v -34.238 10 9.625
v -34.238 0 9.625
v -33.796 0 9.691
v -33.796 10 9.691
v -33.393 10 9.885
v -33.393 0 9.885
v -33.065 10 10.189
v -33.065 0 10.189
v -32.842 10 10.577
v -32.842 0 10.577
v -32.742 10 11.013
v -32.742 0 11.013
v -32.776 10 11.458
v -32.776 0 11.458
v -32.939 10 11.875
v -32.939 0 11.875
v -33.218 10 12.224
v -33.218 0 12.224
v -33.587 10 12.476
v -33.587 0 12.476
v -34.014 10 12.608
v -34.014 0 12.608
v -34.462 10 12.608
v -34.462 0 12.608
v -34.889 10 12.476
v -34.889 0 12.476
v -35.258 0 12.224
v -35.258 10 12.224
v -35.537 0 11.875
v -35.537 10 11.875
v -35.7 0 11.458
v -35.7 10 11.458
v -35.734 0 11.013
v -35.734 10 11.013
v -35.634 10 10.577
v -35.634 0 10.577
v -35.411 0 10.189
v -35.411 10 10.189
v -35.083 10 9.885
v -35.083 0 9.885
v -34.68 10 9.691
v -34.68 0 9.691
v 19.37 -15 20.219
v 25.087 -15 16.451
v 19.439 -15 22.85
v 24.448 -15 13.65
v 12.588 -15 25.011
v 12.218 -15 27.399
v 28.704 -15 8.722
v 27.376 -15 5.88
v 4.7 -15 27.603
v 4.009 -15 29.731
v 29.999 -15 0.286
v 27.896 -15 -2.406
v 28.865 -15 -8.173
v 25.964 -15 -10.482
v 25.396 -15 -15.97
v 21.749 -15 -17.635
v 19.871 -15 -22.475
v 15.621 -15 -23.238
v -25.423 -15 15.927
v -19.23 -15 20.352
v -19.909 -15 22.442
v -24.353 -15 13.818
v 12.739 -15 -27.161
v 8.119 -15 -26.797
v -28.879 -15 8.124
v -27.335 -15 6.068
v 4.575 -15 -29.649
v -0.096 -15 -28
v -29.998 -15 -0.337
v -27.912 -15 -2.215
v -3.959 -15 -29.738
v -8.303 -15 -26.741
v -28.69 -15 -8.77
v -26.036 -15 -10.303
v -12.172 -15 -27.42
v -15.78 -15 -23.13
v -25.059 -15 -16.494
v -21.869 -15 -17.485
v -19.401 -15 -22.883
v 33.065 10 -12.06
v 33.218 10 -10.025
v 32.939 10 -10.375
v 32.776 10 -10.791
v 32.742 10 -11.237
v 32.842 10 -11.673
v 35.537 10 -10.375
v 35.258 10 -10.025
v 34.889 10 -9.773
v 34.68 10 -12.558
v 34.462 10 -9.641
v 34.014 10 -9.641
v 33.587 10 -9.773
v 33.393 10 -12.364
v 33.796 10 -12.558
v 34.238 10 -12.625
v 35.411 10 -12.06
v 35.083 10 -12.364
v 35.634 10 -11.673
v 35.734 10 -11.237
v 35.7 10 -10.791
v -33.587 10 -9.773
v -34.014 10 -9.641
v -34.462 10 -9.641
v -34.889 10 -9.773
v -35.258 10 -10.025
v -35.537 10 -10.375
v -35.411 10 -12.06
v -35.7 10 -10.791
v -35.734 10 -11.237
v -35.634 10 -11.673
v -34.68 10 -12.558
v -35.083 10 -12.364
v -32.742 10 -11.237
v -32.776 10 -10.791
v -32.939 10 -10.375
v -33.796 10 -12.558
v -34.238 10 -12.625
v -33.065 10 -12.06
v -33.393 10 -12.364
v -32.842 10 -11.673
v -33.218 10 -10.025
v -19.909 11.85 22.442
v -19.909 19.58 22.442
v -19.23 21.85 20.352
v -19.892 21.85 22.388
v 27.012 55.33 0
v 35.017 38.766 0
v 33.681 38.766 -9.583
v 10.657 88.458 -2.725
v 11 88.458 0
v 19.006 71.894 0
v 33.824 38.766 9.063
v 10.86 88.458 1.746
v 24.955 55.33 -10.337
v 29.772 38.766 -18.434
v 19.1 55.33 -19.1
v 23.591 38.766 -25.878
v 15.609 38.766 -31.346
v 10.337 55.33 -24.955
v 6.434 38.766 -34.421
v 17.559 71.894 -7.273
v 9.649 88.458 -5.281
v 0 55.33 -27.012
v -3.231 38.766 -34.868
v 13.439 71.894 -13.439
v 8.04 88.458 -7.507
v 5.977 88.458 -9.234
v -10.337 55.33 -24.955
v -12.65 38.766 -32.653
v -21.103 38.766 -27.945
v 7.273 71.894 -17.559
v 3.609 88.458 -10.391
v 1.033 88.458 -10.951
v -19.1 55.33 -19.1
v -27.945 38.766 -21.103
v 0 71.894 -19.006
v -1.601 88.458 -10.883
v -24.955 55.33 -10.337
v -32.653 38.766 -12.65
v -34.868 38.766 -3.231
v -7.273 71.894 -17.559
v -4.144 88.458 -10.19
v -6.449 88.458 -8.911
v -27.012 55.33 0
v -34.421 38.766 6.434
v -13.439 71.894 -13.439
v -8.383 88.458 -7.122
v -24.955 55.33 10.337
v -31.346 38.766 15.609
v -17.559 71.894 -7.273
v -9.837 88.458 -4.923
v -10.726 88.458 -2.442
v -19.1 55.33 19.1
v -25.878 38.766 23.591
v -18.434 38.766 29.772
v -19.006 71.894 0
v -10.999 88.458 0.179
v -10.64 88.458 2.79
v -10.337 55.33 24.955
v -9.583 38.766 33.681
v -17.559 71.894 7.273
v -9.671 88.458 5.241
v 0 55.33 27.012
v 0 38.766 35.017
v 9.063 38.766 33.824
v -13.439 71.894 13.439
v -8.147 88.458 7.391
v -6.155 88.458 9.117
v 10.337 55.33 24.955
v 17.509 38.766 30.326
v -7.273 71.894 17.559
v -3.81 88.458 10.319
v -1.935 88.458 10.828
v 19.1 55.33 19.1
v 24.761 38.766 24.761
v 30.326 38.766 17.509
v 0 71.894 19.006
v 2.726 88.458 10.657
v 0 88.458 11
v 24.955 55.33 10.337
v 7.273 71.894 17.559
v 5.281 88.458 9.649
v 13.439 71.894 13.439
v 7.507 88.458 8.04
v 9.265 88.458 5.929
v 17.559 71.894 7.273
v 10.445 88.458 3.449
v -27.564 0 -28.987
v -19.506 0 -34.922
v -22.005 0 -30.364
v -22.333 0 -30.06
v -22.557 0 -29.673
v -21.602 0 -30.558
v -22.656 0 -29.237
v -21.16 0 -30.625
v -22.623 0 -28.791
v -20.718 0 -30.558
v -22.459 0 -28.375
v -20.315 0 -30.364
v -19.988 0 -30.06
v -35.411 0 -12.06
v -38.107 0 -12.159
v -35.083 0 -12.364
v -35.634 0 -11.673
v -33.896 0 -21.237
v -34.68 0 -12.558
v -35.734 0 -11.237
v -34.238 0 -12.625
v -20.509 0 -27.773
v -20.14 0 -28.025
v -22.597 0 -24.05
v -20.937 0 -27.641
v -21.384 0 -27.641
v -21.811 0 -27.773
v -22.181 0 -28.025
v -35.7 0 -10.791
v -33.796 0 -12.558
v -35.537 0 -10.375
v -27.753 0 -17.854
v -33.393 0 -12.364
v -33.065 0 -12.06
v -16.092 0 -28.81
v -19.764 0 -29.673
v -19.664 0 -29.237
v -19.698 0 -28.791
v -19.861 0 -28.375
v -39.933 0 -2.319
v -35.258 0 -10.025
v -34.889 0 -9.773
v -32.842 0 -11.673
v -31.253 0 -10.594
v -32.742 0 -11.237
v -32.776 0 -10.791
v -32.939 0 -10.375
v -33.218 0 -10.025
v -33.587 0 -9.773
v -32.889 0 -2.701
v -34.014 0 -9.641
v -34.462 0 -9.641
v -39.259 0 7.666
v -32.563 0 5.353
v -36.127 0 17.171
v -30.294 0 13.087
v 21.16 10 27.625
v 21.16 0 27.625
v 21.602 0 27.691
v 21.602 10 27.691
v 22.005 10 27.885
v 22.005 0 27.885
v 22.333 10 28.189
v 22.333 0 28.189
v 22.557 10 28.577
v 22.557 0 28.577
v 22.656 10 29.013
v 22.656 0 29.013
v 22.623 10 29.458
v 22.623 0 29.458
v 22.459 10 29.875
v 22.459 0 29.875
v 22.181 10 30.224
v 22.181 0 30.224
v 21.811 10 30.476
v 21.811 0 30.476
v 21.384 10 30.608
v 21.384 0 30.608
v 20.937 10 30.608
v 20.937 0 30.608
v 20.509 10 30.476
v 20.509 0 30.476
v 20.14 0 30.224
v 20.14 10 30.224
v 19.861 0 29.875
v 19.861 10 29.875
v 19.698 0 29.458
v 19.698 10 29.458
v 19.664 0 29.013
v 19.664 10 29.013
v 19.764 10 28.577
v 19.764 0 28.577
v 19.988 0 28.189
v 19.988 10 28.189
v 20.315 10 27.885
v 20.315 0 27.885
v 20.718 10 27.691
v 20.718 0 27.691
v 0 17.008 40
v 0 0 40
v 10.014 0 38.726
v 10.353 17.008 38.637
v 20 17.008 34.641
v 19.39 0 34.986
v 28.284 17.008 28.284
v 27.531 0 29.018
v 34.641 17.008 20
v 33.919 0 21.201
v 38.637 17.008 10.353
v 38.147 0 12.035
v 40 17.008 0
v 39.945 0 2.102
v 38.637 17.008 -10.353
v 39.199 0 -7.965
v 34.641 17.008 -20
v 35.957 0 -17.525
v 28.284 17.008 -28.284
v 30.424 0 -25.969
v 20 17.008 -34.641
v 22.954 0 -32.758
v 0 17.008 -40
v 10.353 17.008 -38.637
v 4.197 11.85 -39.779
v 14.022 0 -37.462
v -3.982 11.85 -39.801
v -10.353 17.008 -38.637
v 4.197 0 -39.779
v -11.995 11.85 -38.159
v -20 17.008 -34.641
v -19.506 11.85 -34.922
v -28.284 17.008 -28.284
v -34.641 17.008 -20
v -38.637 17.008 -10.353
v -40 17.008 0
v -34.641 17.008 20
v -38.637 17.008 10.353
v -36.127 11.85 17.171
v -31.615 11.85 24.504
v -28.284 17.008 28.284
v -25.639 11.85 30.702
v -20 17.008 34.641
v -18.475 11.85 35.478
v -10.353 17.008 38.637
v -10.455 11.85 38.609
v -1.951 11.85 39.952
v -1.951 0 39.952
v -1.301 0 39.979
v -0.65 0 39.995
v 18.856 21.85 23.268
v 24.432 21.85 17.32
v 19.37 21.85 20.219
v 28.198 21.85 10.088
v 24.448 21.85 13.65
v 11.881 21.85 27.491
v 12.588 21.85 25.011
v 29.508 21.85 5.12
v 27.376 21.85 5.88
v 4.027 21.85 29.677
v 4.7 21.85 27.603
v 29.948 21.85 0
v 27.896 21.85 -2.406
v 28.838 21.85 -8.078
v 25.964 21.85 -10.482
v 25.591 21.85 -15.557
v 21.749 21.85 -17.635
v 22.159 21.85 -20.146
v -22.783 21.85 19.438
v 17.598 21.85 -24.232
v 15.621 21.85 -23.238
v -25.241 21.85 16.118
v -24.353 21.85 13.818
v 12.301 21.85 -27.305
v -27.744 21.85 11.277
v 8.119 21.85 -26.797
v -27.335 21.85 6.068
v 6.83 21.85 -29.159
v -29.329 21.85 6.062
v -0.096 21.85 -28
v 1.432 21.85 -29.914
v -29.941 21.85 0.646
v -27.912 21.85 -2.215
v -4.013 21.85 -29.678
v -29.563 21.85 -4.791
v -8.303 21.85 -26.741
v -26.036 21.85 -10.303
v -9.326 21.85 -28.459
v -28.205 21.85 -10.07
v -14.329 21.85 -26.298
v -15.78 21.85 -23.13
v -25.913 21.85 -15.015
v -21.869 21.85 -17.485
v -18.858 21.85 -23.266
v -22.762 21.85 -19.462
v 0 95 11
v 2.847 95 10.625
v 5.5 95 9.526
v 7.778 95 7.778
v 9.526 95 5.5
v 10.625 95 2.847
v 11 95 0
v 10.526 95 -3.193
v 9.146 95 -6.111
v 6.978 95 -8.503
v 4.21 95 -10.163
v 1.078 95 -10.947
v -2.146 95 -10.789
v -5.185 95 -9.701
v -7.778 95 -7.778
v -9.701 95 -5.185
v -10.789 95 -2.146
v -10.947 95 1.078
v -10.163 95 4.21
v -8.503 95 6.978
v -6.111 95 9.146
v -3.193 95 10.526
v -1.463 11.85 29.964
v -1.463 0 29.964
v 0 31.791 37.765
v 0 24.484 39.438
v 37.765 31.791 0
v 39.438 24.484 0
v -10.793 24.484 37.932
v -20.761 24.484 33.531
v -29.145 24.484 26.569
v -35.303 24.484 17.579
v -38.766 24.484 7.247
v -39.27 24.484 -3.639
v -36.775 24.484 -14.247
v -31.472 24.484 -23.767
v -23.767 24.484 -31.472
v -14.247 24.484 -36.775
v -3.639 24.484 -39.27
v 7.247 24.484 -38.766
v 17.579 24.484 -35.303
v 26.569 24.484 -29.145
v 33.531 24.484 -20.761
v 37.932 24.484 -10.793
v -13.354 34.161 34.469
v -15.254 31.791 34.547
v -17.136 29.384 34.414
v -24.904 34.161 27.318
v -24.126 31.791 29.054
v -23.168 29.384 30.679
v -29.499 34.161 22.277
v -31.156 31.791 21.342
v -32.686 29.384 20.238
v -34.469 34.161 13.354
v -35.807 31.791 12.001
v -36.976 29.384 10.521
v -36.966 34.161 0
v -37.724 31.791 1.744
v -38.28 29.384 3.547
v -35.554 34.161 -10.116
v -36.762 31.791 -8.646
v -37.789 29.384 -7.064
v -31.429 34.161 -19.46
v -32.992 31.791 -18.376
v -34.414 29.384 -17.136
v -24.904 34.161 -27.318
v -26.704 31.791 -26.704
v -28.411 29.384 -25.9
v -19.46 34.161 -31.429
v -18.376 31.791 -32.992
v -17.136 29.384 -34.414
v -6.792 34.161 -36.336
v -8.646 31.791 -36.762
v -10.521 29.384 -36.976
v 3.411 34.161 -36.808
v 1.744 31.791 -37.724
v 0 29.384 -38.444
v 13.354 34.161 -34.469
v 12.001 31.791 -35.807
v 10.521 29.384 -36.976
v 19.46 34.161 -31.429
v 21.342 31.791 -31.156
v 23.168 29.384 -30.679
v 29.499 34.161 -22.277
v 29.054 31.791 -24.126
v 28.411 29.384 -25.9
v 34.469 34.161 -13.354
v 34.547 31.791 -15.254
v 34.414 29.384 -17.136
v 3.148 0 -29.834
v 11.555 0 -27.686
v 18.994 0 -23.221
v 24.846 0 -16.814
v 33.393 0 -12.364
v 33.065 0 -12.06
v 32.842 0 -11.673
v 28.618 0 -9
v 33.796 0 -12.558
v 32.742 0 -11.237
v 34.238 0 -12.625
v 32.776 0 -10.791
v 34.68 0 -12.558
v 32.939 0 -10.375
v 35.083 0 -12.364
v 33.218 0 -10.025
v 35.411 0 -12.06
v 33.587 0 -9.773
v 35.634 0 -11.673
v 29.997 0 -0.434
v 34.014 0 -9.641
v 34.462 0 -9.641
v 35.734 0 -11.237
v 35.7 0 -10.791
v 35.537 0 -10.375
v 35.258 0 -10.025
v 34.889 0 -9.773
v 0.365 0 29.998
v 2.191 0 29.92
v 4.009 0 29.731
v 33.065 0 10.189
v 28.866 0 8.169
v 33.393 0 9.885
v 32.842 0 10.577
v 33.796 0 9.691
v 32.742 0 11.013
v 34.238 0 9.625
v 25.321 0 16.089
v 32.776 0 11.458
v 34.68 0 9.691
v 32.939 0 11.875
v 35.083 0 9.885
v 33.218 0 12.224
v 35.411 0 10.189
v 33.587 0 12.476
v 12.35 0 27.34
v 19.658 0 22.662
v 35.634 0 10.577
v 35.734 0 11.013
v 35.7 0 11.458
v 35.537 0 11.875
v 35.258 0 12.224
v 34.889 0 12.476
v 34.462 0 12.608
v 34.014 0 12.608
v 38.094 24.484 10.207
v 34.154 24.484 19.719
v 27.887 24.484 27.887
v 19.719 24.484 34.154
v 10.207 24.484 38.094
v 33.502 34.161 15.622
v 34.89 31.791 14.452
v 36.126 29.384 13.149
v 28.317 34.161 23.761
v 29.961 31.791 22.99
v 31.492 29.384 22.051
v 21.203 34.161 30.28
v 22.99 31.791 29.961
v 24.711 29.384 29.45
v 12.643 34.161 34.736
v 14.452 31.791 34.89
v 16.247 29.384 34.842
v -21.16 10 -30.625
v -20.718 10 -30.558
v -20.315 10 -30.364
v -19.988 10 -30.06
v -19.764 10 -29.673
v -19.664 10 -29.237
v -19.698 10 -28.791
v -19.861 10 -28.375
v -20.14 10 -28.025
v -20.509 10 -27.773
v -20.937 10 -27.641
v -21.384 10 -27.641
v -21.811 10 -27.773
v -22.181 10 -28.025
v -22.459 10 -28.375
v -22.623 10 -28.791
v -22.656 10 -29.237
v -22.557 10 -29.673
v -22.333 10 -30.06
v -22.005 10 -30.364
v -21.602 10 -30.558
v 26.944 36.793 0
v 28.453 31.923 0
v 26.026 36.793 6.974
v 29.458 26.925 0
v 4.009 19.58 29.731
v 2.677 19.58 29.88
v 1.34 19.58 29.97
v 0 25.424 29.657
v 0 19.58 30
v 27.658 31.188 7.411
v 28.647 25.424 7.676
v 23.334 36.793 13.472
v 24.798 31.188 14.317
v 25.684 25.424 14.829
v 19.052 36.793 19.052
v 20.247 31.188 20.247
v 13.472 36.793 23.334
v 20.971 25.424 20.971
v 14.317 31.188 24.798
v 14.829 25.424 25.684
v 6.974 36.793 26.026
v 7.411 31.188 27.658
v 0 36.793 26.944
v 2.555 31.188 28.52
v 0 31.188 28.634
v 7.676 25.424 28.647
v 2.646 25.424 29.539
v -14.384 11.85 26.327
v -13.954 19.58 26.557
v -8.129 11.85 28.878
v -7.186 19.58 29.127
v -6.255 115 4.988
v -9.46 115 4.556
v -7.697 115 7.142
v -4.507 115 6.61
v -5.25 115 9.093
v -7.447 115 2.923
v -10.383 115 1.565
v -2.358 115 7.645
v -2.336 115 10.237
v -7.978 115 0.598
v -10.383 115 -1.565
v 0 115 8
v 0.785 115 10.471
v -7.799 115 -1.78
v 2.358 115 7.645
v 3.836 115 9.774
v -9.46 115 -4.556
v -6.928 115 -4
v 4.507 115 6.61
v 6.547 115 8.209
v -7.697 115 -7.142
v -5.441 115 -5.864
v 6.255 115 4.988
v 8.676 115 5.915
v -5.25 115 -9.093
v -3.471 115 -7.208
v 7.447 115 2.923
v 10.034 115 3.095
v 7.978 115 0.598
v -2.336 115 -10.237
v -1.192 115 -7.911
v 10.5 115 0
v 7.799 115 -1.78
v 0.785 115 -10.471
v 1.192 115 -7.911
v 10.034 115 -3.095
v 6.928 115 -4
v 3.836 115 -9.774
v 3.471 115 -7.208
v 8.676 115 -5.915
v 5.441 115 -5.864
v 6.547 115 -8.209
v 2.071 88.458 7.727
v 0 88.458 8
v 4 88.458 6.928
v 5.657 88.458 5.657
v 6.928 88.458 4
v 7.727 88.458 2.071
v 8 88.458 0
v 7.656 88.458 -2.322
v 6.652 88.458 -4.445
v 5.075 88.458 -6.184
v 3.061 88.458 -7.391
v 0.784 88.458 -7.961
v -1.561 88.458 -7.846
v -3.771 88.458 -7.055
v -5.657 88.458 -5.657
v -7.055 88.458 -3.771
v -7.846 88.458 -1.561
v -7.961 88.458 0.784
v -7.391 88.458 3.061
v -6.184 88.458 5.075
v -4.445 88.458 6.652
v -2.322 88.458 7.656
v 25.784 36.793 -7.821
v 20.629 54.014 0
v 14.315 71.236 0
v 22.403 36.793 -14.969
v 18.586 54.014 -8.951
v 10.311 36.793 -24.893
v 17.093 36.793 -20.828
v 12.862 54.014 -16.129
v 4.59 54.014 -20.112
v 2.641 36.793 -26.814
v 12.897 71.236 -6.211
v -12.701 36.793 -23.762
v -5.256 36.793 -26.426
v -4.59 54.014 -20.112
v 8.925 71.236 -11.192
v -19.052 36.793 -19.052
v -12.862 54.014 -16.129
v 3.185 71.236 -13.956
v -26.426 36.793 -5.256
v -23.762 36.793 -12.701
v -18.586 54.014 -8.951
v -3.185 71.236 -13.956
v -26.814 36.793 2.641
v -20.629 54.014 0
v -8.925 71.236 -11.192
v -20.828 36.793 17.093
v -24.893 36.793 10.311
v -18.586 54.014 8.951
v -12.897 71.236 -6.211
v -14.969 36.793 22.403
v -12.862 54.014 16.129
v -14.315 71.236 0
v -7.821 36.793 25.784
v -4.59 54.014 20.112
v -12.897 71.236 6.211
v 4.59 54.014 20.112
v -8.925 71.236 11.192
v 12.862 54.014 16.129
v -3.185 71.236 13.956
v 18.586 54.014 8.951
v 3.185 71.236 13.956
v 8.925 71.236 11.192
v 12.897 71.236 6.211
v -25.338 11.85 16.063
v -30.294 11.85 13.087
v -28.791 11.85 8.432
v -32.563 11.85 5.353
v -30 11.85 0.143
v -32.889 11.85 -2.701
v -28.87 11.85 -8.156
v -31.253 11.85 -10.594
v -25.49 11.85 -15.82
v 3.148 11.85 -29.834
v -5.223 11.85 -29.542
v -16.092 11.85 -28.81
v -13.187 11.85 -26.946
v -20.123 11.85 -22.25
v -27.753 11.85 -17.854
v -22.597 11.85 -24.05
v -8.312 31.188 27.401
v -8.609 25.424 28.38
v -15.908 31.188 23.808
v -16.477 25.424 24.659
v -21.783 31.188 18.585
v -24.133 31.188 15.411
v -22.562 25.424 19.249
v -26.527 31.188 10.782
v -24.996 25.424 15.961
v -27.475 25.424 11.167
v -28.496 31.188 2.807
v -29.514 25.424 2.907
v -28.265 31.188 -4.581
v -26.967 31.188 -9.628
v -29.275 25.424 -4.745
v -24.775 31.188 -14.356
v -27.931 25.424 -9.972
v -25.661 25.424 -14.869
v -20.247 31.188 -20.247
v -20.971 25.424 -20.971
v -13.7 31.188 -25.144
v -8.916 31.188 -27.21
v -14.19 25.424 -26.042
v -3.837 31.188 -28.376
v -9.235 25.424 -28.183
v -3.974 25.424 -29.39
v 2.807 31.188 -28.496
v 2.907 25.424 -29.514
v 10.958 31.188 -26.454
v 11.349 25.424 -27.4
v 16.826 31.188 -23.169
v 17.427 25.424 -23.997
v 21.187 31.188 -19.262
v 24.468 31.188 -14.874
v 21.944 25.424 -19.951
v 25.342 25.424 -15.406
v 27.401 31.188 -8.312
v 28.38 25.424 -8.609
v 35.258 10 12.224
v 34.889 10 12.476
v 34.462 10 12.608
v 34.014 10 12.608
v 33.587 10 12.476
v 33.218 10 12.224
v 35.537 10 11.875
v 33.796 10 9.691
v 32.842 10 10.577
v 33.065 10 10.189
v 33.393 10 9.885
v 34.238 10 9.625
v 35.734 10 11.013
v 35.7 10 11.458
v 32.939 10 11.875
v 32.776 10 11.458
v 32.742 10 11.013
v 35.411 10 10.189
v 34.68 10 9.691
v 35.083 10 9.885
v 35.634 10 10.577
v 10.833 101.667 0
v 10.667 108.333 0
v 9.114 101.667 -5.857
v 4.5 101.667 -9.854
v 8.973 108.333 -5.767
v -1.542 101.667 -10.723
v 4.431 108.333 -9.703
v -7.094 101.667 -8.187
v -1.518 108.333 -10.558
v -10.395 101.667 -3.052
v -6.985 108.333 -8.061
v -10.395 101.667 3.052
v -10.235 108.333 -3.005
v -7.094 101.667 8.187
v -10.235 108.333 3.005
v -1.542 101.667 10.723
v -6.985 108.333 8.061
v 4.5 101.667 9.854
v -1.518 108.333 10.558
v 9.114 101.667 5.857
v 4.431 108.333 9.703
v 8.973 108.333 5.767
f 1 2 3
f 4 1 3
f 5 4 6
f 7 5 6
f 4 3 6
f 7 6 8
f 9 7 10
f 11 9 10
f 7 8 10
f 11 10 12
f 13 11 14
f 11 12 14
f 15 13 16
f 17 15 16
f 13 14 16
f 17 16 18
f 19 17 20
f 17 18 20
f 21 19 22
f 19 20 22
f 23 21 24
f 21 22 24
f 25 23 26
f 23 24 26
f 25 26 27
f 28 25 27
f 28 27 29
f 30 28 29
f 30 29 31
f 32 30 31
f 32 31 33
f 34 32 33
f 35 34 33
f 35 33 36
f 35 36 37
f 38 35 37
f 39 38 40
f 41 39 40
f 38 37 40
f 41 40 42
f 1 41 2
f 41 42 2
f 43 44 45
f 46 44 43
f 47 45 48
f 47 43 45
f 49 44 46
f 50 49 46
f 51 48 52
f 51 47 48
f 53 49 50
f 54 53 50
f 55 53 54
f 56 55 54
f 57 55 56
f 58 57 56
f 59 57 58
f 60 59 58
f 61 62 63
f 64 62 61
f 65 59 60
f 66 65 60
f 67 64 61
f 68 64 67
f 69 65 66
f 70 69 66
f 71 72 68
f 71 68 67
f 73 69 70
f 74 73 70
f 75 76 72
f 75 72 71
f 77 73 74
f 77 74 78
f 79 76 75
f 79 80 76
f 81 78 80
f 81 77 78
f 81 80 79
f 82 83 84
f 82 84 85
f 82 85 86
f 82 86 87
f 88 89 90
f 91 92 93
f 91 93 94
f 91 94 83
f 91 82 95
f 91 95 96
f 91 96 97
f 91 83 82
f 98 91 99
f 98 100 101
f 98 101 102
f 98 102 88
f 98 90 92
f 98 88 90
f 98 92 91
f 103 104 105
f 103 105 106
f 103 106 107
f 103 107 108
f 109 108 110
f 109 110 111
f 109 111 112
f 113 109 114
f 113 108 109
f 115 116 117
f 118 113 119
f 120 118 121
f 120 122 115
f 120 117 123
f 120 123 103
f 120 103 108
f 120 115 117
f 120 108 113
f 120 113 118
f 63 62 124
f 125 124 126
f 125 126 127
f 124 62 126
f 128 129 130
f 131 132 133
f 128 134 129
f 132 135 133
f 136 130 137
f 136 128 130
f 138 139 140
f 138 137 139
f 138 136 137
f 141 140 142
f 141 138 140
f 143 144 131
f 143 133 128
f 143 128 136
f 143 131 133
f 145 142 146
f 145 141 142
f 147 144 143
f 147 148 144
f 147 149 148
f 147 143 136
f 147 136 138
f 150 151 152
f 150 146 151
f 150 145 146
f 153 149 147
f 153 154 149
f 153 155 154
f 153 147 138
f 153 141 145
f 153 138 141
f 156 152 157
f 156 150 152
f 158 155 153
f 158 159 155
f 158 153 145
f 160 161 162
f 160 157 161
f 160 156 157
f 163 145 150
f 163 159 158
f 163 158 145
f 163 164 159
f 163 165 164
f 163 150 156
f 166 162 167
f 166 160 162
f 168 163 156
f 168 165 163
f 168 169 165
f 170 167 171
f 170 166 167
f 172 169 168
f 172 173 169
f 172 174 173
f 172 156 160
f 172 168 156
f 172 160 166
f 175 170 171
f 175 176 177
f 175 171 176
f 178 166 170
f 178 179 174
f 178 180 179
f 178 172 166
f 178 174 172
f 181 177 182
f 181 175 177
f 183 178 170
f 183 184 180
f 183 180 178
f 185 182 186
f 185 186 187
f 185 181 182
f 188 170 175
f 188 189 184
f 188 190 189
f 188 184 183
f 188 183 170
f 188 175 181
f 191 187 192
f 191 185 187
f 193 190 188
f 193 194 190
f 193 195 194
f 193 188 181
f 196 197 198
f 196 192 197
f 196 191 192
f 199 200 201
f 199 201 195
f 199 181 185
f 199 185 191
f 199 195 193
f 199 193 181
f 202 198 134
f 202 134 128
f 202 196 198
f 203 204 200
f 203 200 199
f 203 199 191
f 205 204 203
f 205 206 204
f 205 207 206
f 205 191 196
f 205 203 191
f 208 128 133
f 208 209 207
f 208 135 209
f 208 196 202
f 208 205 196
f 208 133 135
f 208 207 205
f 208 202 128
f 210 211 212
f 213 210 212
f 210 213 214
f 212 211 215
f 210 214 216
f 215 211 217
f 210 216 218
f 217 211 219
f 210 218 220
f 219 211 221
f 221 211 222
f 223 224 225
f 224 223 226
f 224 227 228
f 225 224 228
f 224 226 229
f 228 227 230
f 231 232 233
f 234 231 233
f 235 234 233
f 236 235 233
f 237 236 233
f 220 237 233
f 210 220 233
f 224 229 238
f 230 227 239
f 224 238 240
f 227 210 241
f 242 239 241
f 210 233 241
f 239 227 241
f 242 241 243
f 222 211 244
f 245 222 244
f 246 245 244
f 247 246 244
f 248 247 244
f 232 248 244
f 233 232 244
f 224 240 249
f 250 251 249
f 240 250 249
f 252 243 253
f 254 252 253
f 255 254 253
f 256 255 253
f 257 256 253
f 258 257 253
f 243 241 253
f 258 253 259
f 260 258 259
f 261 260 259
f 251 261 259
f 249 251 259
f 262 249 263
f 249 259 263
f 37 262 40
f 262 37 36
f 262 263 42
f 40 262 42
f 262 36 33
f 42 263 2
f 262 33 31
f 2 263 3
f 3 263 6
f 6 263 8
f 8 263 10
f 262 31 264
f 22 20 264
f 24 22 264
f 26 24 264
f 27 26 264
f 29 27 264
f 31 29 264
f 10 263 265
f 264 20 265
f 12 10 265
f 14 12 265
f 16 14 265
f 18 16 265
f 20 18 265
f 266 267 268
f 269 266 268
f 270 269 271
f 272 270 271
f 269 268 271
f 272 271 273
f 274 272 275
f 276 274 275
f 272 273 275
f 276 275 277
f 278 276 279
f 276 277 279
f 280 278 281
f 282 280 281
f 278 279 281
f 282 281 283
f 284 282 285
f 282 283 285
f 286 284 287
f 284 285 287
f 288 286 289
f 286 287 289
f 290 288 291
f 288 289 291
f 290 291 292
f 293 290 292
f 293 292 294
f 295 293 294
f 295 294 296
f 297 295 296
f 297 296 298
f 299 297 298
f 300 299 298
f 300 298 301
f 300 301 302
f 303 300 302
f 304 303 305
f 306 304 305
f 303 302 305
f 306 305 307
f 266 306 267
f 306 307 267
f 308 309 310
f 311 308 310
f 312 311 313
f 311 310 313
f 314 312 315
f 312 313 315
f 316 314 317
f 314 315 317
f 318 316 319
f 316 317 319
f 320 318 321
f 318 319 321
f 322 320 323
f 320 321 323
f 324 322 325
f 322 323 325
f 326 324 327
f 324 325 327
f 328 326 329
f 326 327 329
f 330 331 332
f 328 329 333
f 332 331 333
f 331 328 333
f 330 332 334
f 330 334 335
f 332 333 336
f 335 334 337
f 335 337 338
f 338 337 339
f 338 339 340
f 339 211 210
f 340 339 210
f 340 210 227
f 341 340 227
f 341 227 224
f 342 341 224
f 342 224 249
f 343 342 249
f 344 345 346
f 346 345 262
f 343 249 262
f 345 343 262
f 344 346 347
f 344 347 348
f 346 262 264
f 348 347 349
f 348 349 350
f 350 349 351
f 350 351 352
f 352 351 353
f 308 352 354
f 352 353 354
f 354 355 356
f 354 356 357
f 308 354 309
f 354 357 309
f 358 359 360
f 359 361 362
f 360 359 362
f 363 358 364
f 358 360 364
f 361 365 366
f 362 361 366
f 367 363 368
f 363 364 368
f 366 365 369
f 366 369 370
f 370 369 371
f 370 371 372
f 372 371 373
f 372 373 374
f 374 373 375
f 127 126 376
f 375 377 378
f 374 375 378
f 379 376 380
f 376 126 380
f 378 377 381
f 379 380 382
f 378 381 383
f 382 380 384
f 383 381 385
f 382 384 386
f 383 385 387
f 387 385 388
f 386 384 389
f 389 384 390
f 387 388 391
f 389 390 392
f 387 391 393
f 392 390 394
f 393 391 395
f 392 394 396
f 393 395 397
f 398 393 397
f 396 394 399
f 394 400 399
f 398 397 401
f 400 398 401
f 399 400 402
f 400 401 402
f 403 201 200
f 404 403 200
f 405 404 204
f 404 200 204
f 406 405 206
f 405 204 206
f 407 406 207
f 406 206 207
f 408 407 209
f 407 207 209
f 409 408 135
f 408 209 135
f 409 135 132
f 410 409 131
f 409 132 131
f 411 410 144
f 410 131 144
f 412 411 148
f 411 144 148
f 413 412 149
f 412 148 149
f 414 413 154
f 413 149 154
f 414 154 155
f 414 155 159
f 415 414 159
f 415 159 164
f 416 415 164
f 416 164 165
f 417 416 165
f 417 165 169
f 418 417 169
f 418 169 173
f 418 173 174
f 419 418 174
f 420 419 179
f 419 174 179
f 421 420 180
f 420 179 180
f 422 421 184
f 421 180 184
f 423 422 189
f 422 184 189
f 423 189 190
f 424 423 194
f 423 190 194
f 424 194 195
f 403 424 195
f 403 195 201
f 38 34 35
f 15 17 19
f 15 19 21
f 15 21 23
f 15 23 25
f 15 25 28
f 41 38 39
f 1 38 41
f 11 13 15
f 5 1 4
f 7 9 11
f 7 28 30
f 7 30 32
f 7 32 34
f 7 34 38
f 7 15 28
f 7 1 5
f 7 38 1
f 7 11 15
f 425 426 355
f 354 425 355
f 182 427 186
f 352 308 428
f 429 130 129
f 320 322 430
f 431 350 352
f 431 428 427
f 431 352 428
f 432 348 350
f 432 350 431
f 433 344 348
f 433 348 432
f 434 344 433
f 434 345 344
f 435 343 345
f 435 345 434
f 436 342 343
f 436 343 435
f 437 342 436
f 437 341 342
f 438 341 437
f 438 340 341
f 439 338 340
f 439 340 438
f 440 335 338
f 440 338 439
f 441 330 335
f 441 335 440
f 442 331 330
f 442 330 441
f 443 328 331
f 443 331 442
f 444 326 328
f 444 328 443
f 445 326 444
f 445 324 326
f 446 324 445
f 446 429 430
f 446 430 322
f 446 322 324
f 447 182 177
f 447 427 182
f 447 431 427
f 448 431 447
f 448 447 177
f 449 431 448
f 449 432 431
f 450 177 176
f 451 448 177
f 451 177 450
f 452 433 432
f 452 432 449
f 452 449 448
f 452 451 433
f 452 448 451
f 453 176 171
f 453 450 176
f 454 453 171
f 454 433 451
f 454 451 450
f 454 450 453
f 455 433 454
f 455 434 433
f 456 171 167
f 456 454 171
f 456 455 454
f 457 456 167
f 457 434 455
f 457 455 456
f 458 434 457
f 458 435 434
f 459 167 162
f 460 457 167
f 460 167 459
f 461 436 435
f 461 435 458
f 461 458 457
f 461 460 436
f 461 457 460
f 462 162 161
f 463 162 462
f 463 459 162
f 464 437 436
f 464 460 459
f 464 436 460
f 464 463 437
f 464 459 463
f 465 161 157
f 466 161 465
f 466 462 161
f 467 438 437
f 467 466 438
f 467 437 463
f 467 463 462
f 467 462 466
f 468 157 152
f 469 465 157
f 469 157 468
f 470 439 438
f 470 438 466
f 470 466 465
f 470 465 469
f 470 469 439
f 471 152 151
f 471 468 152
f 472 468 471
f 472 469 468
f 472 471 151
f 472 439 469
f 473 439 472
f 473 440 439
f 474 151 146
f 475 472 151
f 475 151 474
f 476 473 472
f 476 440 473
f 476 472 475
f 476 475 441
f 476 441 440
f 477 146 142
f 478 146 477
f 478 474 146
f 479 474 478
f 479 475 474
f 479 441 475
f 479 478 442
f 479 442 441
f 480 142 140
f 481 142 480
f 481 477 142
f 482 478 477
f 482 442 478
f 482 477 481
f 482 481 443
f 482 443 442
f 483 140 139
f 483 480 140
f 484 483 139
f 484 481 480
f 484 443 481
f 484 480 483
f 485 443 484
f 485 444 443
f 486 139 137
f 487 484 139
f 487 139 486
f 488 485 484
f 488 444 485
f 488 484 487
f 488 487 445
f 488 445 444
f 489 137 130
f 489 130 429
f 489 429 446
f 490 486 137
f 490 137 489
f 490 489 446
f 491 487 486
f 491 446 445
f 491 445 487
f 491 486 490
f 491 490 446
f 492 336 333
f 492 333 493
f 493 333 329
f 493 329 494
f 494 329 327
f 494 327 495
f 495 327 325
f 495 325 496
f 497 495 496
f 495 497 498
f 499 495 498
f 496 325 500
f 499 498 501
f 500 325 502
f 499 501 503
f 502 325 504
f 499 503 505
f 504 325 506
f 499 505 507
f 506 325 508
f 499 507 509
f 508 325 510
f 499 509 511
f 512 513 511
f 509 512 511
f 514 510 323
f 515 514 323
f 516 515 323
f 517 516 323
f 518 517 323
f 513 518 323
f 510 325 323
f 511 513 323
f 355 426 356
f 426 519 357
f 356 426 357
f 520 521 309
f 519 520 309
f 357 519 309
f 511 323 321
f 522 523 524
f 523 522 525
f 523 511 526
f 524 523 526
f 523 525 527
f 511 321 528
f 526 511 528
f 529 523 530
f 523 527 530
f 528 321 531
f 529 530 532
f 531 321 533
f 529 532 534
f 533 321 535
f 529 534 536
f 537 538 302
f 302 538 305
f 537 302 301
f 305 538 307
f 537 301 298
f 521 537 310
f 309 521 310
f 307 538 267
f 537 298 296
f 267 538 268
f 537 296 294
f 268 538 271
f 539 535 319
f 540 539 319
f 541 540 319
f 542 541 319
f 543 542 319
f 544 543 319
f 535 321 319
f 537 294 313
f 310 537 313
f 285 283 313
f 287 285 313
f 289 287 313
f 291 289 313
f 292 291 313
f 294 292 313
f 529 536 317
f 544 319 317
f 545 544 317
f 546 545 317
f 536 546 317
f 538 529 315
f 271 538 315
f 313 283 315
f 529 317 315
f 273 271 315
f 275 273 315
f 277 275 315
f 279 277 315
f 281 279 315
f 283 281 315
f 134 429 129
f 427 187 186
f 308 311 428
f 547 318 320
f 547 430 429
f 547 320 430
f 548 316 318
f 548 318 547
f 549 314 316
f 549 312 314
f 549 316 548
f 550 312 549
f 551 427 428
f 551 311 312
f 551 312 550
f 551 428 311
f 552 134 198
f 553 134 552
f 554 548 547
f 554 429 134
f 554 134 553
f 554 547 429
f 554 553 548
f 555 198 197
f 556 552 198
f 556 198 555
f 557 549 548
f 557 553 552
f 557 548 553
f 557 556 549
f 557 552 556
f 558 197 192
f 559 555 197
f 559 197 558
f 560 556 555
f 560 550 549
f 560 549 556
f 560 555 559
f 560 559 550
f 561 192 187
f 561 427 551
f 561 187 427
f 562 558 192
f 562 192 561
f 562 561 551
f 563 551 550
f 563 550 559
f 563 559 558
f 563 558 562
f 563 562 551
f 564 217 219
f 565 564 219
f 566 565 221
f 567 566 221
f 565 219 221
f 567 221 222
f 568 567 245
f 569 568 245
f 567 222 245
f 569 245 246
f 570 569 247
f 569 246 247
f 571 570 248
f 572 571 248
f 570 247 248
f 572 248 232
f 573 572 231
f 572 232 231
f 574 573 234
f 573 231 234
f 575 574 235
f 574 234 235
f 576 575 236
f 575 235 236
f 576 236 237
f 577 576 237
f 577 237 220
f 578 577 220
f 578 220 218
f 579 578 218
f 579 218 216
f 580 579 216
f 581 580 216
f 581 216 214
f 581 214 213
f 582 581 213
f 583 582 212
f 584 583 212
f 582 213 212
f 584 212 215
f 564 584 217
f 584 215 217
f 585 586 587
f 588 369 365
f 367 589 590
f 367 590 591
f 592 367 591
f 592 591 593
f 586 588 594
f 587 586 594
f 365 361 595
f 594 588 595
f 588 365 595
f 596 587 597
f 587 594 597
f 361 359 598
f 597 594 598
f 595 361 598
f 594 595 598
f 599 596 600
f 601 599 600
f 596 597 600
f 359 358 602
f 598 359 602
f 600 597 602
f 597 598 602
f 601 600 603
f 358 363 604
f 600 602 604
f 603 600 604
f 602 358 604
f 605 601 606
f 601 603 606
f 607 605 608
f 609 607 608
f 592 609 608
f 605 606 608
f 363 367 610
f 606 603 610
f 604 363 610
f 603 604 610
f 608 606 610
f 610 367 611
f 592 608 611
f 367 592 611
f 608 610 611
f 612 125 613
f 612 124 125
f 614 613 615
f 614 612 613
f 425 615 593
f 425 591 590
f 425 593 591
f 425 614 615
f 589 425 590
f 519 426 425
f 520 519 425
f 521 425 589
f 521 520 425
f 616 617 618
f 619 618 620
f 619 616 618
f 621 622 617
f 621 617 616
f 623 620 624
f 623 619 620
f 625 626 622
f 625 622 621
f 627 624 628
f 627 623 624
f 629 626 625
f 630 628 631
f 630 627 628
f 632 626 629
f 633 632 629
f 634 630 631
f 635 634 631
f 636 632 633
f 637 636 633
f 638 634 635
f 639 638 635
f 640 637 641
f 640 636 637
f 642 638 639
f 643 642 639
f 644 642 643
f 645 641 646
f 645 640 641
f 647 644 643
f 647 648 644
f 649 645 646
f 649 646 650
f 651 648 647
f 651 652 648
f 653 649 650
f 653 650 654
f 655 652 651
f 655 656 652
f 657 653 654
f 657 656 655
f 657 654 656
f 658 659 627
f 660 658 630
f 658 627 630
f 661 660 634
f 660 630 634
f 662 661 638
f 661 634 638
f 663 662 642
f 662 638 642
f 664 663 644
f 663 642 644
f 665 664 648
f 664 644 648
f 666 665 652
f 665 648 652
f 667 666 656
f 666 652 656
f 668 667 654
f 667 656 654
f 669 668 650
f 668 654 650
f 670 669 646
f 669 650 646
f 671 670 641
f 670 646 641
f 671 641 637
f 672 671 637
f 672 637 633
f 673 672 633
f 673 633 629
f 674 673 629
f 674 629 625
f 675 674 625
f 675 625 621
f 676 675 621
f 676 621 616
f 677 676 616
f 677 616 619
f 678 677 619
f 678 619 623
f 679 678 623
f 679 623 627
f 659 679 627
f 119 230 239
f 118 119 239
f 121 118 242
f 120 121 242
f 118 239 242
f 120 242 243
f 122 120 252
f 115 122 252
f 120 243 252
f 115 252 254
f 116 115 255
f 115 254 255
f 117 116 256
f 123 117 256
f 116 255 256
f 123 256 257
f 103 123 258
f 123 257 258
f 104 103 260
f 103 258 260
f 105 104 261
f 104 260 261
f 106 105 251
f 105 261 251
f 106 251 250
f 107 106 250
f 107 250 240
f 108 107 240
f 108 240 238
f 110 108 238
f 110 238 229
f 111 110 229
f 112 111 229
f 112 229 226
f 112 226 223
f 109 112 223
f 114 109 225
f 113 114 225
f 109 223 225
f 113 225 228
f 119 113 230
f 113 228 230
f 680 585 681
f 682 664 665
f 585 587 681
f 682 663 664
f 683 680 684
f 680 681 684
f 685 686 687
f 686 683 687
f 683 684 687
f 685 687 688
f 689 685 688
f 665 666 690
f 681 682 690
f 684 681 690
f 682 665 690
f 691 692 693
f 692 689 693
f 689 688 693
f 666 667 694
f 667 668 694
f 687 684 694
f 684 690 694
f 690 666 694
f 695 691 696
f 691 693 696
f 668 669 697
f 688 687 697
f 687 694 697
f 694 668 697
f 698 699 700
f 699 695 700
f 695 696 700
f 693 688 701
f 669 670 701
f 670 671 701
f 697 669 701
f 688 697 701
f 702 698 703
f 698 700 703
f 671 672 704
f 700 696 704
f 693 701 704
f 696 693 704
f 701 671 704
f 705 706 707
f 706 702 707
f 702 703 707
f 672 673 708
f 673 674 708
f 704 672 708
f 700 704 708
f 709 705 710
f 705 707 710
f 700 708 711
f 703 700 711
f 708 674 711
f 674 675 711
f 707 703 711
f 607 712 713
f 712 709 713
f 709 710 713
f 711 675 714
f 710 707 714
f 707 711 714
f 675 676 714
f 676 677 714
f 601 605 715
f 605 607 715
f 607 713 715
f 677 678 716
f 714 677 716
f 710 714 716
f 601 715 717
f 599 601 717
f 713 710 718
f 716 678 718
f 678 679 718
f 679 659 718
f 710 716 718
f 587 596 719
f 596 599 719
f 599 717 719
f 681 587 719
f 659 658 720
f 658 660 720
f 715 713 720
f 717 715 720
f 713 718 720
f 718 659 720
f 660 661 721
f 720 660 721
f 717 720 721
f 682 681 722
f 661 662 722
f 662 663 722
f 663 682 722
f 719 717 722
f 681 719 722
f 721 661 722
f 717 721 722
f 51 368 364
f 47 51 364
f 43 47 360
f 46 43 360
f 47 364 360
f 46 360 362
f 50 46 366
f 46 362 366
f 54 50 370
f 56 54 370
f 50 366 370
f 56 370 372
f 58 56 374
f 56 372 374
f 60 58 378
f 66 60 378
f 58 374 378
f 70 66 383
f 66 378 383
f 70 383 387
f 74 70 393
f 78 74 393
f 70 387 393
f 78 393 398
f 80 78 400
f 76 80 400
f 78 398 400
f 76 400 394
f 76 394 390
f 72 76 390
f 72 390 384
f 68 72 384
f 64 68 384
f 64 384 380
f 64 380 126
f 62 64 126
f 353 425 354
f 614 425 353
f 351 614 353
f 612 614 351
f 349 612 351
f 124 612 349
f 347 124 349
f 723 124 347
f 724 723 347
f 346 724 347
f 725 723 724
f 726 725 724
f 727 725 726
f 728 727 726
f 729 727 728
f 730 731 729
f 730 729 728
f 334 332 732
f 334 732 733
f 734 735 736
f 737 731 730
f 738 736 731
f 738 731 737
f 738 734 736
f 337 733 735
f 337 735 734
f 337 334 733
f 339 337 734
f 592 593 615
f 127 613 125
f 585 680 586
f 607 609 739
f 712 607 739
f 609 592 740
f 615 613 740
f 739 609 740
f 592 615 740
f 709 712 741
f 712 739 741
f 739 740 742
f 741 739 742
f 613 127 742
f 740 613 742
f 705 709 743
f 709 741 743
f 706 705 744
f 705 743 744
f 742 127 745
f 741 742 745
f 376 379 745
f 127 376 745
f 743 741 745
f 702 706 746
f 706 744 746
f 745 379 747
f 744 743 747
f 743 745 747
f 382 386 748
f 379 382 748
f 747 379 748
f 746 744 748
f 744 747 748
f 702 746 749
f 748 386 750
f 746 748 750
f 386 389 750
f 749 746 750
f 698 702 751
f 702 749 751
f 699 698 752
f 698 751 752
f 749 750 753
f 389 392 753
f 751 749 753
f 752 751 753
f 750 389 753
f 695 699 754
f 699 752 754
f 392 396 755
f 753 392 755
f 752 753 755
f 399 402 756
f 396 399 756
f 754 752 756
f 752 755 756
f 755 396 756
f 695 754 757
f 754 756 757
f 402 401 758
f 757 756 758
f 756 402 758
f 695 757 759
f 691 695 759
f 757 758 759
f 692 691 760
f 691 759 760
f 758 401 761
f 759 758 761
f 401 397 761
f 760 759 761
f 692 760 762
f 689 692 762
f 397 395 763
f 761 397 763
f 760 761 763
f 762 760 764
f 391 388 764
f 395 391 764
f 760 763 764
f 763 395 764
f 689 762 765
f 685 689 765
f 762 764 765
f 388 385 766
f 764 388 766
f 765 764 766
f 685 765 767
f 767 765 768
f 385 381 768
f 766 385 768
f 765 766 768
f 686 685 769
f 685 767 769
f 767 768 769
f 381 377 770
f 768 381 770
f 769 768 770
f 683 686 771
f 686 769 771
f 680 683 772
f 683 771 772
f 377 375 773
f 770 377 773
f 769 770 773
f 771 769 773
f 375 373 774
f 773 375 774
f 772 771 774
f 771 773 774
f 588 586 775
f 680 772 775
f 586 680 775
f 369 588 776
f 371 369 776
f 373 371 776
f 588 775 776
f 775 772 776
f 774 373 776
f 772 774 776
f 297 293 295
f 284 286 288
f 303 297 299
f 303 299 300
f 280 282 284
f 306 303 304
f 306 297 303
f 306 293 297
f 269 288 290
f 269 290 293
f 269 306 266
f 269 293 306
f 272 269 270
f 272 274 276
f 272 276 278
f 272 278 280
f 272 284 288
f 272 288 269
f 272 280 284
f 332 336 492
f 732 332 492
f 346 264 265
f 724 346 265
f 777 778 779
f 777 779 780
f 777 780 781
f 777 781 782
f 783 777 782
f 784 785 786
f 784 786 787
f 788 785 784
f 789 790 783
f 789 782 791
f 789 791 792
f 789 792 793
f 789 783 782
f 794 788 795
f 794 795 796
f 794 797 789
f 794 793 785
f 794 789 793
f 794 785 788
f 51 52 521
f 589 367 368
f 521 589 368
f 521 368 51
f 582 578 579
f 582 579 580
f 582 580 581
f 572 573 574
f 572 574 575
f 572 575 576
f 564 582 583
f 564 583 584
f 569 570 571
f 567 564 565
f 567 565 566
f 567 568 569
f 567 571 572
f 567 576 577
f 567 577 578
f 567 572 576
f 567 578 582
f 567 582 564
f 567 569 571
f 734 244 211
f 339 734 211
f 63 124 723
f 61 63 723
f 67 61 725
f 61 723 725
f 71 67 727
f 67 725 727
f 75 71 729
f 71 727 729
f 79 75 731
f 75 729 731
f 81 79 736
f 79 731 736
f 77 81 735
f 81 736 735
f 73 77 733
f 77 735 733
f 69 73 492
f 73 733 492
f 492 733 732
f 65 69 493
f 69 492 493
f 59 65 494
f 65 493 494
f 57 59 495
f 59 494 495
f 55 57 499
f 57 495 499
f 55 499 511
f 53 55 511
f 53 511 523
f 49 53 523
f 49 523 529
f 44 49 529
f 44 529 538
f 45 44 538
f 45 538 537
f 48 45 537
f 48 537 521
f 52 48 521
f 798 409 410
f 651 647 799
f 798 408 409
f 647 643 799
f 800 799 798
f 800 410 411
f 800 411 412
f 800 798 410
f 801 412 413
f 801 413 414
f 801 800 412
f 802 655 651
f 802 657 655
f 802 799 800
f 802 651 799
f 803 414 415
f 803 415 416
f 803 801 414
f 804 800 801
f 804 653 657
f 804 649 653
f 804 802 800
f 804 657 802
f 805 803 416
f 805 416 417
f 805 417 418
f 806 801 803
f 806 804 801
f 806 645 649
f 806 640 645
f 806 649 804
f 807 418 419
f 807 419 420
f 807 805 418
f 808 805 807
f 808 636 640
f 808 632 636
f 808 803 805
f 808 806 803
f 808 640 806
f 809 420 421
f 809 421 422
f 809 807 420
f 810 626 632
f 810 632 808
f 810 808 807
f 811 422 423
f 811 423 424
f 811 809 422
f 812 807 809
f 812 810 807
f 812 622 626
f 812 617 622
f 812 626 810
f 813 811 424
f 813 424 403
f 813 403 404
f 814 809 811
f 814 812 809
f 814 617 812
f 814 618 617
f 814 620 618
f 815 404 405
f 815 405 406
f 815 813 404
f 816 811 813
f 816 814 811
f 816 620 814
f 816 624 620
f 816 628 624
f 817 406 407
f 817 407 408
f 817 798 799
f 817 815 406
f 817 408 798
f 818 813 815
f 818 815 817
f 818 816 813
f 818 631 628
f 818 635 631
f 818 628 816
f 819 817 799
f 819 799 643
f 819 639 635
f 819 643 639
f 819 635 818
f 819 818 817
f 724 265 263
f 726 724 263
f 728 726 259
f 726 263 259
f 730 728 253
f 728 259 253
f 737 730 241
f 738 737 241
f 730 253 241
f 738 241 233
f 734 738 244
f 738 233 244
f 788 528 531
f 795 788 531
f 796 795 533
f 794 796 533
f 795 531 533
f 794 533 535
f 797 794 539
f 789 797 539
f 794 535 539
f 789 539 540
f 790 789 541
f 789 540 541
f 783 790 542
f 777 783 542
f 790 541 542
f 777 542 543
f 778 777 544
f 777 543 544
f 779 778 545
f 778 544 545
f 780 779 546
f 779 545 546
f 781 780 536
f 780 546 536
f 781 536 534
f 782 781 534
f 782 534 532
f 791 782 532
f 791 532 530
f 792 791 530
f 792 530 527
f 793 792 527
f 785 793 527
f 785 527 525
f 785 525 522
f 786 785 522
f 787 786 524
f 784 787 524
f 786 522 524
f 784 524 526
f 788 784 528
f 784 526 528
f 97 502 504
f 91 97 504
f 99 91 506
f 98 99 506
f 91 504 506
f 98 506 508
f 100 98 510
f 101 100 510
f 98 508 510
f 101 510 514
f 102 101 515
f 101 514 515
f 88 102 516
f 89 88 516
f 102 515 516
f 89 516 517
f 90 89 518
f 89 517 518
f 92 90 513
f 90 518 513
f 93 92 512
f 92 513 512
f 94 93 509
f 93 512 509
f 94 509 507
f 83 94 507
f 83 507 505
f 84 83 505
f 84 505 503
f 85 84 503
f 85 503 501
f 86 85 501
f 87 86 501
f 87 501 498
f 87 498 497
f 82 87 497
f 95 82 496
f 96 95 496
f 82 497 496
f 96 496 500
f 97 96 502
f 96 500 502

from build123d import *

# Parameters (mm, degrees)
ESBO_O1_R                     = 40
ESBO_O1_R_2                   = 30
RESSALTO_EXTRUS_O1_DEPTH      = 50
ESBO_O2_R                     = 1.500000000000004
ESBO_O2_R_2                   = 1.4999999999999962
ESBO_O2_R_3                   = 1.5
ESBO_O2_R_4                   = 1.500000000000002
ESBO_O2_R_5                   = 1.5000000000000018
CORTE_EXTRUS_O1_DEPTH         = 10
CORTE_EXTRUS_O2_DEPTH         = 11.84997677
RESSALTO_EXTRUS_O2_DEPTH      = 26.849976769999998
RESSALTO_EXTRUS_O2_DEPTH_BACK = 10
REVOLU_O1_ANGLE               = 180.0000000000004
RESSALTO_EXTRUS_O5_DEPTH      = 5
RESSALTO_EXTRUS_O5_DEPTH_BACK = 2
ESBO_O10_R                    = 11
ESBO_O13_R                    = 8
CORTE_EXTRUS_O4_DEPTH         = 40
CORTE_EXTRUS_O5_DEPTH         = 120
FILETE1_R                     = 50
FILETE2_R                     = 50


# Read off the part's stored shape, not the designer's step: Limites1, Limites2, Limites-Corte1
with BuildPart() as part:
    # Esboço1 → Ressalto-extrusão1 (new body)
    with BuildSketch(Plane(origin=(0, 0, 0), x_dir=(1, 0, 0), z_dir=(0, 1, 0))):
        with Locations(Location((0, 0, 0), (0, 0, 270))):
            Circle(ESBO_O1_R)
        with Locations(Location((0, 0, 0), (0, 0, 270))):
            Circle(ESBO_O1_R_2, mode=Mode.SUBTRACT)
    extrude(amount=RESSALTO_EXTRUS_O1_DEPTH)

    # Esboço2 → Corte-extrusão1 (cut)
    with BuildSketch(Plane(origin=(0, 0, 0), x_dir=(-1, 0, 0), z_dir=(0, -1, 0))):
        with Locations(Location((-21.160269082529076, -29.124611797498083, 0), (0, 0, 90))):
            Circle(ESBO_O2_R)
        with Locations(Location((-34.23803458662555, -11.124611797498012, 0), (0, 0, 90))):
            Circle(ESBO_O2_R_2)
        with Locations(Location((-34.23803458662548, 11.124611797498257, 0), (0, 0, 90))):
            Circle(ESBO_O2_R_3)
        with Locations(Location((21.16026908252929, 29.124611797497916, 0), (0, 0, 90))):
            Circle(ESBO_O2_R_4)
        with Locations(Location((34.23803458662564, 11.124611797497778, 0), (0, 0, 90))):
            Circle(ESBO_O2_R_5)
        with Locations(Location((34.2380345866254, -11.124611797498495, 0), (0, 0, 90))):
            Circle(ESBO_O2_R_4)
    extrude(amount=-CORTE_EXTRUS_O1_DEPTH, mode=Mode.SUBTRACT)

    # Esboço3 → Corte-extrusão2 (cut)
    with BuildSketch(Plane(origin=(0, 0, 0), x_dir=(-1, 0, 0), z_dir=(0, -1, 0))):
        with BuildLine():
            ThreePointArc((30.293924667807104, -13.087327008263706), (31.253408488730912, 10.59360457240701), (16.0923575286481, 28.810345870366824))
            Line((16.092357528648105, 28.810345870366824), (19.505887913512822, 34.921631358020406))
            ThreePointArc((19.505887913512836, 34.9216313580204), (8.030354378354186, 39.18562757642205), (-4.197370072970371, 39.77916646274194))
            Line((-4.19737007297038, 39.779166462741934), (-3.1480275547272187, 29.83437484705651))
            ThreePointArc((-3.148027554727219, 29.834374847056512), (29.911212101346653, 2.3063804170720696), (1.462902849126346, -29.964310692122016))
            Line((1.4629028491263463, -29.96431069212202), (1.9505371321681024, -39.952414256162704))
            ThreePointArc((1.9505371321681024, -39.952414256162704), (22.185986251539575, -33.283359416478625), (36.12685933386897, -17.171197822832383))
            Line((36.12685933386898, -17.171197822832383), (30.293924667807104, -13.087327008263708))
        make_face()
    extrude(amount=-CORTE_EXTRUS_O2_DEPTH, mode=Mode.SUBTRACT)

    # Esboço4 → Ressalto-extrusão2 (add, two sides: drawn at the far end of the back side and taken through both)
    with BuildSketch(Plane(origin=(0, 11.84997677, 0), x_dir=(-1, 0, 0), z_dir=(0, -1, 0)).offset(-RESSALTO_EXTRUS_O2_DEPTH_BACK)):
        with BuildLine():
            Line((-4.008838628941714, -29.730947056007228), (-4.700362462642585, -27.60265553746198))
            ThreePointArc((-4.700362462642585, -27.60265553746198), (-8.119302431706847, 26.796957439651234), (19.23025849893697, -20.351834267801586))
            Line((19.23025849893697, -20.351834267801586), (19.909240802048483, -22.441526924121003))
            ThreePointArc((19.909240802048483, -22.441526924121003), (-8.745833795666464, 28.696870756557733), (-4.008838628941714, -29.730947056007228))
        make_face()
    extrude(amount=RESSALTO_EXTRUS_O2_DEPTH + RESSALTO_EXTRUS_O2_DEPTH_BACK)

    # Esboço9 → Revolução1 (revolve)
    with BuildSketch(Plane(origin=(0, 50, 0), x_dir=(1, 0, 0), z_dir=(0, 1, 0))):
        with BuildLine():
            Line((-40, 0), (-30, 0))
            ThreePointArc((-30, 0), (1.84e-15, 30), (30, 0))
            Line((30, 0), (40, 0))
            ThreePointArc((40, 0), (2.45e-15, 40), (-40, 0))
        make_face()
    revolve(axis=Axis((-40, 50, 0), (1, 0, 0)), revolution_arc=REVOLU_O1_ANGLE)

    # Esboço10 → Ressalto-extrusão5 (add, two sides: drawn at the far end of the back side and taken through both)
    with BuildSketch(Plane(origin=(0, 90, 0), x_dir=(1, 0, 0), z_dir=(0, 1, 0)).offset(-RESSALTO_EXTRUS_O5_DEPTH_BACK)):
        with Locations(Location((0, 0, 0), (0, 0, 270))):
            Circle(ESBO_O10_R)
    extrude(amount=RESSALTO_EXTRUS_O5_DEPTH + RESSALTO_EXTRUS_O5_DEPTH_BACK)

    # Limites1 outline → Limites1 (revolve)
    with BuildSketch(Plane.XY):
        Polygon((11, 95), (10.5, 115), (0, 115), (0, 95), align=None)
    revolve(axis=Axis((0, 0, 0), (0, 1, 0)))

    # Esboço13 → Corte-extrusão4 (cut)
    with BuildSketch(Plane(origin=(0, 115, 0), x_dir=(1, 0, 0), z_dir=(0, 1, 0))):
        with Locations(Location((0, 0, 0), (0, 0, 270))):
            Circle(ESBO_O13_R)
    extrude(amount=-CORTE_EXTRUS_O4_DEPTH, mode=Mode.SUBTRACT)

    # Esboço14 → Corte-extrusão5 (cut)
    with BuildSketch(Plane(origin=(61.11285487653572, 0, -34.135303848647126), x_dir=(-0.487647197837817, 0, -0.8730407839505122), z_dir=(0.8730407839505123, 0, -0.48764719783781707))):
        Polygon((54.65634856725553, 88.45776904605881), (-53.65162953624658, 88.45776904605881), (-53.651629536246595, 28.457769046058818), (54.65634856725555, 28.457769046058818), align=None)
    extrude(amount=-CORTE_EXTRUS_O5_DEPTH, mode=Mode.SUBTRACT)


with BuildPart() as corte_extrus_o5_piece_1:
    # of the separate pieces the step leaves, piece 1, a body of its own (corte_extrus_o5_pieces)
    add(part.part.solids().sort_by_distance((0, 0, 40))[0])



with BuildPart() as corte_extrus_o5_piece_2:
    # of the separate pieces the step leaves, piece 2, a body of its own (corte_extrus_o5_pieces)
    add(part.part.solids().sort_by_distance((0, 88.457769046, 11))[0])


with BuildPart() as corte_extrus_o5_piece_1_1:
    add(corte_extrus_o5_piece_1.part)

    add(corte_extrus_o5_piece_2.part)  # Limites2 merges Corte-extrusão5 piece 2
    # Limites2 outline → Limites2 (revolve)
    with BuildSketch(Plane.XY):
        Polygon((0, 88.457769046), (0, 28.457769046), (40, 28.457769046), (11, 88.457769046), align=None)
    revolve(axis=Axis((0, 0, 0), (0, 1, 0)))

    # Limites-Corte1 outline → Limites-Corte1 (revolve, cut)
    with BuildSketch(Plane.XY):
        Polygon((30, 28.457769046), (8, 88.457769046), (0, 88.457769046), (0, 28.457769046), align=None)
    revolve(axis=Axis((0, 0, 0), (0, 1, 0)), mode=Mode.SUBTRACT)

    # Filete1
    # the kernel refuses this fillet: 50 mm, written as the material it takes off along each edge
    with BuildSketch(Plane(origin=(0, 28.457769046058818, 0), x_dir=(-1.8e-16, 0, 1), z_dir=(1, 0, 1.8e-16))) as filete1_piece_1:
        with BuildLine():
            CenterArc((40 - FILETE1_R, FILETE1_R * 0.228994080214), FILETE1_R, 334.2039735055, 25.79602649449996)
            Line((40, FILETE1_R * 0.228994080214), (40, 0))
            Line((40, 0), (40 - FILETE1_R * 0.0996510471581, -FILETE1_R * 0.206174580326))
        make_face()
    revolve(axis=Axis((0, 28.457769046058818, 0), (0, -1, 0)), revolution_arc=270, mode=Mode.SUBTRACT)
    with BuildSketch(Plane(origin=(0, 28.457769046058818, 0), x_dir=(1, 0, 0), z_dir=(0, 0, -1))) as filete1_piece_2:
        with BuildLine():
            CenterArc((40 - FILETE1_R, FILETE1_R * 0.228994080214), FILETE1_R, 334.2039735055, 25.79602649449996)
            Line((40, FILETE1_R * 0.228994080214), (40, 0))
            Line((40, 0), (40 - FILETE1_R * 0.0996510471581, -FILETE1_R * 0.206174580326))
        make_face()
    revolve(axis=Axis((0, 28.457769046058818, 0), (0, -1, 0)), revolution_arc=90, mode=Mode.SUBTRACT)

    # Filete2
    # the kernel refuses this fillet: 50 mm, written as the material it adds along each edge
    with BuildSketch(Plane(origin=(0, 28.457769046058818, 0), x_dir=(-1.8e-16, 0, 1), z_dir=(1, 0, 1.8e-16))) as filete2_piece_1:
        with BuildLine():
            CenterArc((30 - FILETE2_R, FILETE2_R * 0.177553692487), FILETE2_R, 339.86369657175186, 20.136303428248137)
            Line((30.000000000000007, FILETE2_R * 0.177553692487), (30, 0))
            Line((30, 0), (30 - FILETE2_R * 0.0611236841134, -FILETE2_R * 0.166700956672))
        make_face()
    revolve(axis=Axis((0, 28.457769046058818, 0), (0, -1, 0)), revolution_arc=270)
    with BuildSketch(Plane(origin=(0, 28.457769046058818, 0), x_dir=(1, 0, 0), z_dir=(0, 0, -1))) as filete2_piece_2:
        with BuildLine():
            CenterArc((30 - FILETE2_R, FILETE2_R * 0.177553692487), FILETE2_R, 339.86369657175186, 20.136303428248137)
            Line((30.000000000000007, FILETE2_R * 0.177553692487), (30, 0))
            Line((30, 0), (30 - FILETE2_R * 0.0611236841134, -FILETE2_R * 0.166700956672))
        make_face()
    revolve(axis=Axis((0, 28.457769046058818, 0), (0, -1, 0)), revolution_arc=90)


solid = corte_extrus_o5_piece_1_1.part
